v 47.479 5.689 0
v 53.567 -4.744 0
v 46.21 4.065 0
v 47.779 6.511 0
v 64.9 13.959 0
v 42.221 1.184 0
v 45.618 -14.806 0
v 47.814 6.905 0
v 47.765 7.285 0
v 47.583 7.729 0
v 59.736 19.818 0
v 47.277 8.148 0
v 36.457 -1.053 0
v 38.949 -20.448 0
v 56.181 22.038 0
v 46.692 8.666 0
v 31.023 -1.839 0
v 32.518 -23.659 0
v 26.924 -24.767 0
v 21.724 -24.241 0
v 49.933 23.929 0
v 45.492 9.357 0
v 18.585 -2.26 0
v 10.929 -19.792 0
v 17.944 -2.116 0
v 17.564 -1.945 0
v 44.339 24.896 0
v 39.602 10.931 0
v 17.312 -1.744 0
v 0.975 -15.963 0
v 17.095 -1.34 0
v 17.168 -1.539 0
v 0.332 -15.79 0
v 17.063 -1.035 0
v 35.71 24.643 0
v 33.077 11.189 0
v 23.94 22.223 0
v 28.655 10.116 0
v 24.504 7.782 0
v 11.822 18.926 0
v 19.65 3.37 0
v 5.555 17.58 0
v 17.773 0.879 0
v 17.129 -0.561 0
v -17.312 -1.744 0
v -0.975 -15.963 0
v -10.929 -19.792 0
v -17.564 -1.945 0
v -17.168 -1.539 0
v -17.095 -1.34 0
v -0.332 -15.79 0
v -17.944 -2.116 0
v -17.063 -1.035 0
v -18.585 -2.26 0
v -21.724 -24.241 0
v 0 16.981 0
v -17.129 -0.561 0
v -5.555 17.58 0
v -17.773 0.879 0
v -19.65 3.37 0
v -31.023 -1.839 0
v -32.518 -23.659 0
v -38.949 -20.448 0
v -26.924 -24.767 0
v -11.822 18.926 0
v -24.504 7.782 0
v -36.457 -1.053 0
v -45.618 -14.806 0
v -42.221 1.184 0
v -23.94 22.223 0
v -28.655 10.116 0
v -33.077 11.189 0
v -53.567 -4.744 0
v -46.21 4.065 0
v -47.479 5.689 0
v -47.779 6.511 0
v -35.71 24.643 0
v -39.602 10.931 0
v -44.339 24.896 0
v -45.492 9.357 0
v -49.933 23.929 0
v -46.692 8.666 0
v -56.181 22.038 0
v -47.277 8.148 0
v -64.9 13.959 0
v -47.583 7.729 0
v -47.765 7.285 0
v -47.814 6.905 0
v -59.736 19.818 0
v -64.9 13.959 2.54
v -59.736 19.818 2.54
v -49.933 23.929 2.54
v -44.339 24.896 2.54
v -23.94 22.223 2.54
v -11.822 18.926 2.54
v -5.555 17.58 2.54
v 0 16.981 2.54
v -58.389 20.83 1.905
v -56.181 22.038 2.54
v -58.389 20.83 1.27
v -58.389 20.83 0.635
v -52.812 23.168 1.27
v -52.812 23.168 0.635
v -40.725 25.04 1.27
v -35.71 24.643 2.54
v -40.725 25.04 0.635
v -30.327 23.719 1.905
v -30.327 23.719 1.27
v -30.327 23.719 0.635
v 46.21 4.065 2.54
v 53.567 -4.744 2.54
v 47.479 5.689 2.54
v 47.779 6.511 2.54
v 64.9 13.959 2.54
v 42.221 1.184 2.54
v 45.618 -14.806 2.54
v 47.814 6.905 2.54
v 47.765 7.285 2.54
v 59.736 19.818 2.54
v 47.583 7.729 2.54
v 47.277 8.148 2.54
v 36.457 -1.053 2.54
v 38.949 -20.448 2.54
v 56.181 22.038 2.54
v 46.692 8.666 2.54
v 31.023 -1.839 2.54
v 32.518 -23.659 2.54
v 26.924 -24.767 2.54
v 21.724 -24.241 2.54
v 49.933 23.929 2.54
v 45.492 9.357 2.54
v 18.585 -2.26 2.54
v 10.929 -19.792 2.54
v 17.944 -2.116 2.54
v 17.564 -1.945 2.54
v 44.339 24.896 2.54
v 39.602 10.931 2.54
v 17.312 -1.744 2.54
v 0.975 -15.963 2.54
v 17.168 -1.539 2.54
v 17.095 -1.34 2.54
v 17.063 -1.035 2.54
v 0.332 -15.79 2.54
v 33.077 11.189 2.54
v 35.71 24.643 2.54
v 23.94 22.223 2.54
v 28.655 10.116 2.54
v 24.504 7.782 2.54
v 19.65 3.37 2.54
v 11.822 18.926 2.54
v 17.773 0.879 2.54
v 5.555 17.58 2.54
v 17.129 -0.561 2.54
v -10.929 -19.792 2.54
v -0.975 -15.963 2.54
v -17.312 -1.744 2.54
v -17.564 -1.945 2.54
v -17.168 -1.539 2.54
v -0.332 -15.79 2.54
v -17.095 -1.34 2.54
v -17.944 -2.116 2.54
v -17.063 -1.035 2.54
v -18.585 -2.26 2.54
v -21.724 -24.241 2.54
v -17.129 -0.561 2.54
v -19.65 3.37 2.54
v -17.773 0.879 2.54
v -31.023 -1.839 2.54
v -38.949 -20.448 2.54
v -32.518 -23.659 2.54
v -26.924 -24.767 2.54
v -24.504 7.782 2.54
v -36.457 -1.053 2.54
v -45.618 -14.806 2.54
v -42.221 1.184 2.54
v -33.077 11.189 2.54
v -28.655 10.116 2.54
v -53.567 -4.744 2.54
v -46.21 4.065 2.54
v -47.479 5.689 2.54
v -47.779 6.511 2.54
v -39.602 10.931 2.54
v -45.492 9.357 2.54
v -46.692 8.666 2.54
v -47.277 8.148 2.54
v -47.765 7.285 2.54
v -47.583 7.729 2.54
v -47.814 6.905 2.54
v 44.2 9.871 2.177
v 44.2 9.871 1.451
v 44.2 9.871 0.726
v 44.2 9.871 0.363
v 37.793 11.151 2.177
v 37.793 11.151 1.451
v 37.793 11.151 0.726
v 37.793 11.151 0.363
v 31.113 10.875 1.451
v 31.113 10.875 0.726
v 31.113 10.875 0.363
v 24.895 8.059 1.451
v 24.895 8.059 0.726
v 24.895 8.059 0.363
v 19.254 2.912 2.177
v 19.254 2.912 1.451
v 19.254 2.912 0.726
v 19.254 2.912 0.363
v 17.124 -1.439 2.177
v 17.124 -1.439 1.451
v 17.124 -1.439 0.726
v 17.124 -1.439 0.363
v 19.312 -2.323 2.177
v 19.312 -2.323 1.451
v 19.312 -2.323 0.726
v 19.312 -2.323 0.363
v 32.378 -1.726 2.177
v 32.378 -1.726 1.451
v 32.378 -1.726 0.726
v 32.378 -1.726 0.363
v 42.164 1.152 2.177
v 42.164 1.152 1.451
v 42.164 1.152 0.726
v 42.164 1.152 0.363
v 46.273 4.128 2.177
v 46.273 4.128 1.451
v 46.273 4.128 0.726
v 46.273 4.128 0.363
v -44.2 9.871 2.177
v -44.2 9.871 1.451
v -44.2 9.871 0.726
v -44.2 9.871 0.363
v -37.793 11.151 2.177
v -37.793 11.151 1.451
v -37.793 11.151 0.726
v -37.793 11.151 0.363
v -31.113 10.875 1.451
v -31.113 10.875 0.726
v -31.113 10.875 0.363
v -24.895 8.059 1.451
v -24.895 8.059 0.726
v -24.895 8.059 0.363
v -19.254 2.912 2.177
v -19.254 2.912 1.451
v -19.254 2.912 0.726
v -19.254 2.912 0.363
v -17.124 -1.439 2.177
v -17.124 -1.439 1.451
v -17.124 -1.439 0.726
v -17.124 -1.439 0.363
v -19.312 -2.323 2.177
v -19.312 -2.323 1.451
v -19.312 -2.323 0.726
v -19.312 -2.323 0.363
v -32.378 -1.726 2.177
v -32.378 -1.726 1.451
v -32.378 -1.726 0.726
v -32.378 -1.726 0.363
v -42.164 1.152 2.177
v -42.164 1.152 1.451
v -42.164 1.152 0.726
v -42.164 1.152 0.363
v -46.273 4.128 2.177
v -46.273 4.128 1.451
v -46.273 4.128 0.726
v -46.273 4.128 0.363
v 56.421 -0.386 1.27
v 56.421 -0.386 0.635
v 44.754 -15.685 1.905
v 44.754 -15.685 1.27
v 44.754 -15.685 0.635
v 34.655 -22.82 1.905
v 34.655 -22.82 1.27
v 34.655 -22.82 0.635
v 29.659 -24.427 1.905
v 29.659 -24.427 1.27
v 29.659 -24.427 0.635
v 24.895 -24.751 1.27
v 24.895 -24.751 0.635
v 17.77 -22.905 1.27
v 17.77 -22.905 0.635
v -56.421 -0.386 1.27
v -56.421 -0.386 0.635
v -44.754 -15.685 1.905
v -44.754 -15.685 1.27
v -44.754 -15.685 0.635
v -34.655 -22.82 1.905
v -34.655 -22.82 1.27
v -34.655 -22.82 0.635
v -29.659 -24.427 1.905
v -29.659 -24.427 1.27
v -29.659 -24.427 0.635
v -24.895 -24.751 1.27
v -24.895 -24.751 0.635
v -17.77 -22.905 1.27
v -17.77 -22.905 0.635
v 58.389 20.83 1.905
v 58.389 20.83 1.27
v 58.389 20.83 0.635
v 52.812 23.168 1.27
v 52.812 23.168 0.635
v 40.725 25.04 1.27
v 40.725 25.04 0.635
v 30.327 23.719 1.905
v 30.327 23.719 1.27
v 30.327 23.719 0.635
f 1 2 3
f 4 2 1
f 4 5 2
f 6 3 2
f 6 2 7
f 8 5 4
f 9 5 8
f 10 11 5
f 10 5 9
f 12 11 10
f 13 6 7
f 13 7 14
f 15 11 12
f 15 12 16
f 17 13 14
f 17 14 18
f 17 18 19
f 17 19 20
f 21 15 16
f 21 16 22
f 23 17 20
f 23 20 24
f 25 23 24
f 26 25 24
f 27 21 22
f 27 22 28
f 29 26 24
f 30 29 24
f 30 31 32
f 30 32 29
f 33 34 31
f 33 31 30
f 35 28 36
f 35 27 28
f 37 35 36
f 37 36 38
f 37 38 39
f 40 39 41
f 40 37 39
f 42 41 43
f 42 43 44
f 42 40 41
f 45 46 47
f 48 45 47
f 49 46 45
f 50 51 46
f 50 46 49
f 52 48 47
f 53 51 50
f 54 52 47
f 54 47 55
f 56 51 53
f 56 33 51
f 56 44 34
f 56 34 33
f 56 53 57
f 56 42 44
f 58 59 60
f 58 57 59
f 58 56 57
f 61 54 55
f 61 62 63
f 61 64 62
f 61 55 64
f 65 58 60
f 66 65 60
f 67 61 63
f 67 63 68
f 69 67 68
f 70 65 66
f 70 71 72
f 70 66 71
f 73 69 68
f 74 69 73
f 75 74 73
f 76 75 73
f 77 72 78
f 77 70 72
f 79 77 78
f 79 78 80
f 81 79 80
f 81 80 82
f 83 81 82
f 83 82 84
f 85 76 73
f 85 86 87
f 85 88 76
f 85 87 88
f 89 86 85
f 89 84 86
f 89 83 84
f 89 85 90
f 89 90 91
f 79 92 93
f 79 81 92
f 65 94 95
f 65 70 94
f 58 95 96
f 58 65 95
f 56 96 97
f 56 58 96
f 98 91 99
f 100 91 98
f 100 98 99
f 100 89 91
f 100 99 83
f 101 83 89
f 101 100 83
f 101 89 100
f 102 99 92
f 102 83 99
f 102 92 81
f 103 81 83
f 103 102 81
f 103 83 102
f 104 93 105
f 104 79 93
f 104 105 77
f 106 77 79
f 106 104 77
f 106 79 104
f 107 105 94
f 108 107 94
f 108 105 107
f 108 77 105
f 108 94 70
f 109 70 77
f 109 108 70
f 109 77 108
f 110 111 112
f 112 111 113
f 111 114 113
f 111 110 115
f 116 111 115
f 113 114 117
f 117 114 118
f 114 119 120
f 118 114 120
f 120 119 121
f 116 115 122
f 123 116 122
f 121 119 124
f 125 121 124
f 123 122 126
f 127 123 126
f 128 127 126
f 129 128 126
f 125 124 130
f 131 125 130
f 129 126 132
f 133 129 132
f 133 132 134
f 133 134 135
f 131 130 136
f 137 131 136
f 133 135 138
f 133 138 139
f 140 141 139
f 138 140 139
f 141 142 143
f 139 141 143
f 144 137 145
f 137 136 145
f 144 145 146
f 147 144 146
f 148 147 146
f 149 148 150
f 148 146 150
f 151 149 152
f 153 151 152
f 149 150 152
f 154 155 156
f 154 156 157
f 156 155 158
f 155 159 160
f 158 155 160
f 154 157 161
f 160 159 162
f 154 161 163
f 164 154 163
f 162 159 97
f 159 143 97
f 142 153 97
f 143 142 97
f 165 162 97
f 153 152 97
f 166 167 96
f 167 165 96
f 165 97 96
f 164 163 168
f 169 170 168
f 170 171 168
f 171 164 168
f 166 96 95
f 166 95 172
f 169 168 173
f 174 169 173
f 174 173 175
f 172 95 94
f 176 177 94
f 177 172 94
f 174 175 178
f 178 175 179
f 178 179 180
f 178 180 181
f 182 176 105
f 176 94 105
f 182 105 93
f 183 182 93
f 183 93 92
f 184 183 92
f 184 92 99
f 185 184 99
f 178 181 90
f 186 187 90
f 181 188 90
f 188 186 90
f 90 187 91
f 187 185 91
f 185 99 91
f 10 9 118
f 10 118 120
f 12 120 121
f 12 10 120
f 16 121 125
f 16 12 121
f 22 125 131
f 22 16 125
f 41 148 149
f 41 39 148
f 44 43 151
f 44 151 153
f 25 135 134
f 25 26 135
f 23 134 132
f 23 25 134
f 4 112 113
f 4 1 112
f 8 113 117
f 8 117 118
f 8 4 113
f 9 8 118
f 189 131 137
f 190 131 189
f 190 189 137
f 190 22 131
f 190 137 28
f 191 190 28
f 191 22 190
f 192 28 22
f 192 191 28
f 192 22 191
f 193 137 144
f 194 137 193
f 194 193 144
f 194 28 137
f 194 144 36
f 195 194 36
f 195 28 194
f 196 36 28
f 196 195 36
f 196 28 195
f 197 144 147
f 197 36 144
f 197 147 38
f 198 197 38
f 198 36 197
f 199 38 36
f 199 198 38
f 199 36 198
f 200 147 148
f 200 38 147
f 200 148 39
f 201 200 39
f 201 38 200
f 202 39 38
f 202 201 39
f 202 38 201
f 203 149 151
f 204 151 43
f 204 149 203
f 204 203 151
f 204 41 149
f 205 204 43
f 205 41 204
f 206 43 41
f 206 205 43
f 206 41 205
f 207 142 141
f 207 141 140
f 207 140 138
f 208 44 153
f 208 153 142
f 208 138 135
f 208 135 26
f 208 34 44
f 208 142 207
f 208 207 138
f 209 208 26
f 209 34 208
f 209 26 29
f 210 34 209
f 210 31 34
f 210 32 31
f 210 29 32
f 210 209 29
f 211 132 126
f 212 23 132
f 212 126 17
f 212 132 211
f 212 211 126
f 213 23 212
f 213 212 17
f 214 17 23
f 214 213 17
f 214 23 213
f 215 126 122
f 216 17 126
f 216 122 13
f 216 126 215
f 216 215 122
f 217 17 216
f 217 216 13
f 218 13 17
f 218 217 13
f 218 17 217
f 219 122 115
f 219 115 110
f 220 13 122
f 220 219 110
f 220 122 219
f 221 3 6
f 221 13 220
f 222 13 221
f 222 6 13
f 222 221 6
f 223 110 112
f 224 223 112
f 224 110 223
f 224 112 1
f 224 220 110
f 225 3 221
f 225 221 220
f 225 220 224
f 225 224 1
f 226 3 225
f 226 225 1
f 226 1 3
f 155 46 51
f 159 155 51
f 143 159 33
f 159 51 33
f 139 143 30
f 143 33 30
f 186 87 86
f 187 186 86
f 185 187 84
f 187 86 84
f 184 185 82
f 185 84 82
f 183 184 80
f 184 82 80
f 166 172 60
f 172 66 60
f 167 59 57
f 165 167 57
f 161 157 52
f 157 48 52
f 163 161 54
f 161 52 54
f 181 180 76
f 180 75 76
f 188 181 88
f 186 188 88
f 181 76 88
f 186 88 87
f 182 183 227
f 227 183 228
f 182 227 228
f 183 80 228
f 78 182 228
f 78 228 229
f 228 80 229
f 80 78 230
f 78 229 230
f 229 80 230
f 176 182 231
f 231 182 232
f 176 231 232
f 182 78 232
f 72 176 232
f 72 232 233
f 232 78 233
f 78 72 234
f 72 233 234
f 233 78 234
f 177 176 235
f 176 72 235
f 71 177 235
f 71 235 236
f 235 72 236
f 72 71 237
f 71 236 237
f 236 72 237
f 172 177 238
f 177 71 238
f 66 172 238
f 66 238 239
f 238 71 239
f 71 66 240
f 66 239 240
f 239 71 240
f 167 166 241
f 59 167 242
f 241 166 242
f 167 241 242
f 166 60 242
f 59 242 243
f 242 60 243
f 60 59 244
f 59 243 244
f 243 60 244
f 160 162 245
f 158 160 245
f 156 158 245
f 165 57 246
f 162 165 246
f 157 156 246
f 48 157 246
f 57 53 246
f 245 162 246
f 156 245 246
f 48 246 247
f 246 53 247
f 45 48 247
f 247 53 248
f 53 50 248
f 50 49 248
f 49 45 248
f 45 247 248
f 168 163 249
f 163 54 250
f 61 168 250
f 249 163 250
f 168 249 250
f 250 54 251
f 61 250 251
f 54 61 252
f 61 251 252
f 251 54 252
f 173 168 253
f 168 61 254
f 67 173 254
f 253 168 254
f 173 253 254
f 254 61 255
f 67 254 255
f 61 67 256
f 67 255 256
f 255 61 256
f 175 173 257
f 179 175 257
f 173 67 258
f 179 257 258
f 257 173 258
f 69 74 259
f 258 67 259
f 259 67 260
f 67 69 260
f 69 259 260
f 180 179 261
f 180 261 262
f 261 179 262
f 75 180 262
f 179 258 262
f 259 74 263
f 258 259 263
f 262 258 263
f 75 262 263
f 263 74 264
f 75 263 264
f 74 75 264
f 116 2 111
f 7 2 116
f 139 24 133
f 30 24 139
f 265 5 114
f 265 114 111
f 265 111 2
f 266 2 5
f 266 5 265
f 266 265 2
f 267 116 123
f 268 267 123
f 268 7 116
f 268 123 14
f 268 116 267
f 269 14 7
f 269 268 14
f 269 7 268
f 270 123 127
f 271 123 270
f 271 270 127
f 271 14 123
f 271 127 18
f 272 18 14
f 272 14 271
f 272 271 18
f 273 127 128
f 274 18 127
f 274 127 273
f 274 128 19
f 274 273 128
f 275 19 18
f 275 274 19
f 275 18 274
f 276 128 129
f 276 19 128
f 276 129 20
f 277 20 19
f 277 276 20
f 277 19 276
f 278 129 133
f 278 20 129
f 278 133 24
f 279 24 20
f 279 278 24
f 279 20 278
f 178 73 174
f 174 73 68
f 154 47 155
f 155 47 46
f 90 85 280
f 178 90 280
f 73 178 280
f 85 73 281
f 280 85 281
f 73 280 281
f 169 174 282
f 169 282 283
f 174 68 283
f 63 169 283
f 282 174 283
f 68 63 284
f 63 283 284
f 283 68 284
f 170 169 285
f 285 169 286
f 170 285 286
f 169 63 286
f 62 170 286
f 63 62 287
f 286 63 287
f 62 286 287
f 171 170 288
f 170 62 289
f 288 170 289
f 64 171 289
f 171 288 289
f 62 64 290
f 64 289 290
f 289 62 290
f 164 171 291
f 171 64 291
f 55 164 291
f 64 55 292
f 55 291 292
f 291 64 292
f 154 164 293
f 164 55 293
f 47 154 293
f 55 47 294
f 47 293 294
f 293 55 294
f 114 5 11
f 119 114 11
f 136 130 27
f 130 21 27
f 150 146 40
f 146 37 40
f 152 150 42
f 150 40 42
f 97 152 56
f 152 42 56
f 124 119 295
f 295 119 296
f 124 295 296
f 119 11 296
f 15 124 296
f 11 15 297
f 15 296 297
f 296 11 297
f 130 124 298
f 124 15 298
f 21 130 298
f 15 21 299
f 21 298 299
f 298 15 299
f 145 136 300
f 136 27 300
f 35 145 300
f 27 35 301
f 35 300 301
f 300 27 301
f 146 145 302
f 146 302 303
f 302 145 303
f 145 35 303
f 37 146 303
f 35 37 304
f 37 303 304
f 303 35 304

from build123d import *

# Parameters (mm, degrees)
F1_DEPTH = 2.54


with BuildPart() as f1:
    # F0 (on Top) → F1 (new body)
    with BuildSketch(Plane.XY):
        with BuildLine():
            add(Edge.make_bspline(
                [(-64.9001970887, 13.9585789293), (-59.8424235445, 21.0693185661), (-53.7346048637, 23.0257404726), (-40.3145630415, 26.4282743713), (-18.8814266067, 21.0659037421), (-6.7937120551, 17.3061378378), (0, 16.9809884228)],
                knots=[0, 0, 0, 0, 0.236178933, 0.4480704868, 0.7301373435, 1, 1, 1, 1], degree=3))
            add(Edge.make_bspline(
                [(-64.9001970887, 13.9585789293), (-60.7131418232, 6.874283925), (-47.3204689226, -18.4135182685), (-25.1756609398, -27.5932197086), (-12.0182650538, -19.6967941746), (-3.849485648, -17.1576407451), (-0.9746632453, -15.96304804)],
                knots=[0, 0, 0, 0, 0.3337918688, 0.5942910183, 0.8077332916, 0.9798868813, 0.9798868813, 0.9798868813, 0.9798868813], degree=3))
            add(Edge.make_bspline(
                [(-0.9746632453, -15.96304804), (-0.6387908173, -15.8234808959), (-0.3134590553, -15.6830816698), (0, -15.541062241)],
                knots=[0.9798868813, 0.9798868813, 0.9798868813, 0.9798868813, 1, 1, 1, 1], degree=3))
            add(Edge.make_bspline(
                [(0.9746632453, -15.96304804), (0.6387908173, -15.8234808959), (0.3134590553, -15.6830816698), (0, -15.541062241)],
                knots=[0.9798868813, 0.9798868813, 0.9798868813, 0.9798868813, 1, 1, 1, 1], degree=3))
            add(Edge.make_bspline(
                [(64.9001970887, 13.9585789293), (60.7131418232, 6.874283925), (47.3204689226, -18.4135182685), (25.1756609398, -27.5932197086), (12.0182650538, -19.6967941746), (3.849485648, -17.1576407451), (0.9746632453, -15.96304804)],
                knots=[0, 0, 0, 0, 0.3337918688, 0.5942910183, 0.8077332916, 0.9798868813, 0.9798868813, 0.9798868813, 0.9798868813], degree=3))
            add(Edge.make_bspline(
                [(64.9001970887, 13.9585789293), (59.8424235445, 21.0693185661), (53.7346048637, 23.0257404726), (40.3145630415, 26.4282743713), (18.8814266067, 21.0659037421), (6.7937120551, 17.3061378378), (0, 16.9809884228)],
                knots=[0, 0, 0, 0, 0.236178933, 0.4480704868, 0.7301373435, 1, 1, 1, 1], degree=3))
        make_face()
        with BuildLine():
            add(Edge.make_bspline(
                [(-47.7647706866, 7.2845630348), (-47.2238090705, 9.4418665585), (-36.443945915, 12.1785918421), (-25.3808361667, 10.3769526965), (-13.4196607123, -3.1638753962), (-24.0941982433, -1.8972065882), (-32.4275500412, -2.0995535899), (-41.7821849404, -0.0363742902), (-48.2414855386, 5.383469502), (-47.7647706866, 7.2845630348)],
                knots=[0, 0, 0, 0, 0.1486904868, 0.3142704588, 0.4735401823, 0.5857095329, 0.7237633974, 0.8689685898, 1, 1, 1, 1], degree=3))
        make_face(mode=Mode.SUBTRACT)
        with BuildLine():
            add(Edge.make_bspline(
                [(47.7647706866, 7.2845630348), (47.2238090705, 9.4418665585), (36.443945915, 12.1785918421), (25.3808361667, 10.3769526965), (13.4196607123, -3.1638753962), (24.0941982433, -1.8972065882), (32.4275500412, -2.0995535899), (41.7821849404, -0.0363742902), (48.2414855386, 5.383469502), (47.7647706866, 7.2845630348)],
                knots=[0, 0, 0, 0, 0.1486904868, 0.3142704588, 0.4735401823, 0.5857095329, 0.7237633974, 0.8689685898, 1, 1, 1, 1], degree=3))
        make_face(mode=Mode.SUBTRACT)
        with BuildLine():
            add(Edge.make_bspline(
                [(-0.9746632453, -15.96304804), (-0.6387908173, -15.8234808959), (-0.3134590553, -15.6830816698), (0, -15.541062241)],
                knots=[0.9798868813, 0.9798868813, 0.9798868813, 0.9798868813, 1, 1, 1, 1], degree=3))
            ThreePointArc((-0.9746632453, -15.96304804), (0, -15.7686037435), (0.9746632453, -15.96304804))
            add(Edge.make_bspline(
                [(0.9746632453, -15.96304804), (0.6387908173, -15.8234808959), (0.3134590553, -15.6830816698), (0, -15.541062241)],
                knots=[0.9798868813, 0.9798868813, 0.9798868813, 0.9798868813, 1, 1, 1, 1], degree=3))
        make_face()
    extrude(amount=F1_DEPTH)


solid = f1.part
